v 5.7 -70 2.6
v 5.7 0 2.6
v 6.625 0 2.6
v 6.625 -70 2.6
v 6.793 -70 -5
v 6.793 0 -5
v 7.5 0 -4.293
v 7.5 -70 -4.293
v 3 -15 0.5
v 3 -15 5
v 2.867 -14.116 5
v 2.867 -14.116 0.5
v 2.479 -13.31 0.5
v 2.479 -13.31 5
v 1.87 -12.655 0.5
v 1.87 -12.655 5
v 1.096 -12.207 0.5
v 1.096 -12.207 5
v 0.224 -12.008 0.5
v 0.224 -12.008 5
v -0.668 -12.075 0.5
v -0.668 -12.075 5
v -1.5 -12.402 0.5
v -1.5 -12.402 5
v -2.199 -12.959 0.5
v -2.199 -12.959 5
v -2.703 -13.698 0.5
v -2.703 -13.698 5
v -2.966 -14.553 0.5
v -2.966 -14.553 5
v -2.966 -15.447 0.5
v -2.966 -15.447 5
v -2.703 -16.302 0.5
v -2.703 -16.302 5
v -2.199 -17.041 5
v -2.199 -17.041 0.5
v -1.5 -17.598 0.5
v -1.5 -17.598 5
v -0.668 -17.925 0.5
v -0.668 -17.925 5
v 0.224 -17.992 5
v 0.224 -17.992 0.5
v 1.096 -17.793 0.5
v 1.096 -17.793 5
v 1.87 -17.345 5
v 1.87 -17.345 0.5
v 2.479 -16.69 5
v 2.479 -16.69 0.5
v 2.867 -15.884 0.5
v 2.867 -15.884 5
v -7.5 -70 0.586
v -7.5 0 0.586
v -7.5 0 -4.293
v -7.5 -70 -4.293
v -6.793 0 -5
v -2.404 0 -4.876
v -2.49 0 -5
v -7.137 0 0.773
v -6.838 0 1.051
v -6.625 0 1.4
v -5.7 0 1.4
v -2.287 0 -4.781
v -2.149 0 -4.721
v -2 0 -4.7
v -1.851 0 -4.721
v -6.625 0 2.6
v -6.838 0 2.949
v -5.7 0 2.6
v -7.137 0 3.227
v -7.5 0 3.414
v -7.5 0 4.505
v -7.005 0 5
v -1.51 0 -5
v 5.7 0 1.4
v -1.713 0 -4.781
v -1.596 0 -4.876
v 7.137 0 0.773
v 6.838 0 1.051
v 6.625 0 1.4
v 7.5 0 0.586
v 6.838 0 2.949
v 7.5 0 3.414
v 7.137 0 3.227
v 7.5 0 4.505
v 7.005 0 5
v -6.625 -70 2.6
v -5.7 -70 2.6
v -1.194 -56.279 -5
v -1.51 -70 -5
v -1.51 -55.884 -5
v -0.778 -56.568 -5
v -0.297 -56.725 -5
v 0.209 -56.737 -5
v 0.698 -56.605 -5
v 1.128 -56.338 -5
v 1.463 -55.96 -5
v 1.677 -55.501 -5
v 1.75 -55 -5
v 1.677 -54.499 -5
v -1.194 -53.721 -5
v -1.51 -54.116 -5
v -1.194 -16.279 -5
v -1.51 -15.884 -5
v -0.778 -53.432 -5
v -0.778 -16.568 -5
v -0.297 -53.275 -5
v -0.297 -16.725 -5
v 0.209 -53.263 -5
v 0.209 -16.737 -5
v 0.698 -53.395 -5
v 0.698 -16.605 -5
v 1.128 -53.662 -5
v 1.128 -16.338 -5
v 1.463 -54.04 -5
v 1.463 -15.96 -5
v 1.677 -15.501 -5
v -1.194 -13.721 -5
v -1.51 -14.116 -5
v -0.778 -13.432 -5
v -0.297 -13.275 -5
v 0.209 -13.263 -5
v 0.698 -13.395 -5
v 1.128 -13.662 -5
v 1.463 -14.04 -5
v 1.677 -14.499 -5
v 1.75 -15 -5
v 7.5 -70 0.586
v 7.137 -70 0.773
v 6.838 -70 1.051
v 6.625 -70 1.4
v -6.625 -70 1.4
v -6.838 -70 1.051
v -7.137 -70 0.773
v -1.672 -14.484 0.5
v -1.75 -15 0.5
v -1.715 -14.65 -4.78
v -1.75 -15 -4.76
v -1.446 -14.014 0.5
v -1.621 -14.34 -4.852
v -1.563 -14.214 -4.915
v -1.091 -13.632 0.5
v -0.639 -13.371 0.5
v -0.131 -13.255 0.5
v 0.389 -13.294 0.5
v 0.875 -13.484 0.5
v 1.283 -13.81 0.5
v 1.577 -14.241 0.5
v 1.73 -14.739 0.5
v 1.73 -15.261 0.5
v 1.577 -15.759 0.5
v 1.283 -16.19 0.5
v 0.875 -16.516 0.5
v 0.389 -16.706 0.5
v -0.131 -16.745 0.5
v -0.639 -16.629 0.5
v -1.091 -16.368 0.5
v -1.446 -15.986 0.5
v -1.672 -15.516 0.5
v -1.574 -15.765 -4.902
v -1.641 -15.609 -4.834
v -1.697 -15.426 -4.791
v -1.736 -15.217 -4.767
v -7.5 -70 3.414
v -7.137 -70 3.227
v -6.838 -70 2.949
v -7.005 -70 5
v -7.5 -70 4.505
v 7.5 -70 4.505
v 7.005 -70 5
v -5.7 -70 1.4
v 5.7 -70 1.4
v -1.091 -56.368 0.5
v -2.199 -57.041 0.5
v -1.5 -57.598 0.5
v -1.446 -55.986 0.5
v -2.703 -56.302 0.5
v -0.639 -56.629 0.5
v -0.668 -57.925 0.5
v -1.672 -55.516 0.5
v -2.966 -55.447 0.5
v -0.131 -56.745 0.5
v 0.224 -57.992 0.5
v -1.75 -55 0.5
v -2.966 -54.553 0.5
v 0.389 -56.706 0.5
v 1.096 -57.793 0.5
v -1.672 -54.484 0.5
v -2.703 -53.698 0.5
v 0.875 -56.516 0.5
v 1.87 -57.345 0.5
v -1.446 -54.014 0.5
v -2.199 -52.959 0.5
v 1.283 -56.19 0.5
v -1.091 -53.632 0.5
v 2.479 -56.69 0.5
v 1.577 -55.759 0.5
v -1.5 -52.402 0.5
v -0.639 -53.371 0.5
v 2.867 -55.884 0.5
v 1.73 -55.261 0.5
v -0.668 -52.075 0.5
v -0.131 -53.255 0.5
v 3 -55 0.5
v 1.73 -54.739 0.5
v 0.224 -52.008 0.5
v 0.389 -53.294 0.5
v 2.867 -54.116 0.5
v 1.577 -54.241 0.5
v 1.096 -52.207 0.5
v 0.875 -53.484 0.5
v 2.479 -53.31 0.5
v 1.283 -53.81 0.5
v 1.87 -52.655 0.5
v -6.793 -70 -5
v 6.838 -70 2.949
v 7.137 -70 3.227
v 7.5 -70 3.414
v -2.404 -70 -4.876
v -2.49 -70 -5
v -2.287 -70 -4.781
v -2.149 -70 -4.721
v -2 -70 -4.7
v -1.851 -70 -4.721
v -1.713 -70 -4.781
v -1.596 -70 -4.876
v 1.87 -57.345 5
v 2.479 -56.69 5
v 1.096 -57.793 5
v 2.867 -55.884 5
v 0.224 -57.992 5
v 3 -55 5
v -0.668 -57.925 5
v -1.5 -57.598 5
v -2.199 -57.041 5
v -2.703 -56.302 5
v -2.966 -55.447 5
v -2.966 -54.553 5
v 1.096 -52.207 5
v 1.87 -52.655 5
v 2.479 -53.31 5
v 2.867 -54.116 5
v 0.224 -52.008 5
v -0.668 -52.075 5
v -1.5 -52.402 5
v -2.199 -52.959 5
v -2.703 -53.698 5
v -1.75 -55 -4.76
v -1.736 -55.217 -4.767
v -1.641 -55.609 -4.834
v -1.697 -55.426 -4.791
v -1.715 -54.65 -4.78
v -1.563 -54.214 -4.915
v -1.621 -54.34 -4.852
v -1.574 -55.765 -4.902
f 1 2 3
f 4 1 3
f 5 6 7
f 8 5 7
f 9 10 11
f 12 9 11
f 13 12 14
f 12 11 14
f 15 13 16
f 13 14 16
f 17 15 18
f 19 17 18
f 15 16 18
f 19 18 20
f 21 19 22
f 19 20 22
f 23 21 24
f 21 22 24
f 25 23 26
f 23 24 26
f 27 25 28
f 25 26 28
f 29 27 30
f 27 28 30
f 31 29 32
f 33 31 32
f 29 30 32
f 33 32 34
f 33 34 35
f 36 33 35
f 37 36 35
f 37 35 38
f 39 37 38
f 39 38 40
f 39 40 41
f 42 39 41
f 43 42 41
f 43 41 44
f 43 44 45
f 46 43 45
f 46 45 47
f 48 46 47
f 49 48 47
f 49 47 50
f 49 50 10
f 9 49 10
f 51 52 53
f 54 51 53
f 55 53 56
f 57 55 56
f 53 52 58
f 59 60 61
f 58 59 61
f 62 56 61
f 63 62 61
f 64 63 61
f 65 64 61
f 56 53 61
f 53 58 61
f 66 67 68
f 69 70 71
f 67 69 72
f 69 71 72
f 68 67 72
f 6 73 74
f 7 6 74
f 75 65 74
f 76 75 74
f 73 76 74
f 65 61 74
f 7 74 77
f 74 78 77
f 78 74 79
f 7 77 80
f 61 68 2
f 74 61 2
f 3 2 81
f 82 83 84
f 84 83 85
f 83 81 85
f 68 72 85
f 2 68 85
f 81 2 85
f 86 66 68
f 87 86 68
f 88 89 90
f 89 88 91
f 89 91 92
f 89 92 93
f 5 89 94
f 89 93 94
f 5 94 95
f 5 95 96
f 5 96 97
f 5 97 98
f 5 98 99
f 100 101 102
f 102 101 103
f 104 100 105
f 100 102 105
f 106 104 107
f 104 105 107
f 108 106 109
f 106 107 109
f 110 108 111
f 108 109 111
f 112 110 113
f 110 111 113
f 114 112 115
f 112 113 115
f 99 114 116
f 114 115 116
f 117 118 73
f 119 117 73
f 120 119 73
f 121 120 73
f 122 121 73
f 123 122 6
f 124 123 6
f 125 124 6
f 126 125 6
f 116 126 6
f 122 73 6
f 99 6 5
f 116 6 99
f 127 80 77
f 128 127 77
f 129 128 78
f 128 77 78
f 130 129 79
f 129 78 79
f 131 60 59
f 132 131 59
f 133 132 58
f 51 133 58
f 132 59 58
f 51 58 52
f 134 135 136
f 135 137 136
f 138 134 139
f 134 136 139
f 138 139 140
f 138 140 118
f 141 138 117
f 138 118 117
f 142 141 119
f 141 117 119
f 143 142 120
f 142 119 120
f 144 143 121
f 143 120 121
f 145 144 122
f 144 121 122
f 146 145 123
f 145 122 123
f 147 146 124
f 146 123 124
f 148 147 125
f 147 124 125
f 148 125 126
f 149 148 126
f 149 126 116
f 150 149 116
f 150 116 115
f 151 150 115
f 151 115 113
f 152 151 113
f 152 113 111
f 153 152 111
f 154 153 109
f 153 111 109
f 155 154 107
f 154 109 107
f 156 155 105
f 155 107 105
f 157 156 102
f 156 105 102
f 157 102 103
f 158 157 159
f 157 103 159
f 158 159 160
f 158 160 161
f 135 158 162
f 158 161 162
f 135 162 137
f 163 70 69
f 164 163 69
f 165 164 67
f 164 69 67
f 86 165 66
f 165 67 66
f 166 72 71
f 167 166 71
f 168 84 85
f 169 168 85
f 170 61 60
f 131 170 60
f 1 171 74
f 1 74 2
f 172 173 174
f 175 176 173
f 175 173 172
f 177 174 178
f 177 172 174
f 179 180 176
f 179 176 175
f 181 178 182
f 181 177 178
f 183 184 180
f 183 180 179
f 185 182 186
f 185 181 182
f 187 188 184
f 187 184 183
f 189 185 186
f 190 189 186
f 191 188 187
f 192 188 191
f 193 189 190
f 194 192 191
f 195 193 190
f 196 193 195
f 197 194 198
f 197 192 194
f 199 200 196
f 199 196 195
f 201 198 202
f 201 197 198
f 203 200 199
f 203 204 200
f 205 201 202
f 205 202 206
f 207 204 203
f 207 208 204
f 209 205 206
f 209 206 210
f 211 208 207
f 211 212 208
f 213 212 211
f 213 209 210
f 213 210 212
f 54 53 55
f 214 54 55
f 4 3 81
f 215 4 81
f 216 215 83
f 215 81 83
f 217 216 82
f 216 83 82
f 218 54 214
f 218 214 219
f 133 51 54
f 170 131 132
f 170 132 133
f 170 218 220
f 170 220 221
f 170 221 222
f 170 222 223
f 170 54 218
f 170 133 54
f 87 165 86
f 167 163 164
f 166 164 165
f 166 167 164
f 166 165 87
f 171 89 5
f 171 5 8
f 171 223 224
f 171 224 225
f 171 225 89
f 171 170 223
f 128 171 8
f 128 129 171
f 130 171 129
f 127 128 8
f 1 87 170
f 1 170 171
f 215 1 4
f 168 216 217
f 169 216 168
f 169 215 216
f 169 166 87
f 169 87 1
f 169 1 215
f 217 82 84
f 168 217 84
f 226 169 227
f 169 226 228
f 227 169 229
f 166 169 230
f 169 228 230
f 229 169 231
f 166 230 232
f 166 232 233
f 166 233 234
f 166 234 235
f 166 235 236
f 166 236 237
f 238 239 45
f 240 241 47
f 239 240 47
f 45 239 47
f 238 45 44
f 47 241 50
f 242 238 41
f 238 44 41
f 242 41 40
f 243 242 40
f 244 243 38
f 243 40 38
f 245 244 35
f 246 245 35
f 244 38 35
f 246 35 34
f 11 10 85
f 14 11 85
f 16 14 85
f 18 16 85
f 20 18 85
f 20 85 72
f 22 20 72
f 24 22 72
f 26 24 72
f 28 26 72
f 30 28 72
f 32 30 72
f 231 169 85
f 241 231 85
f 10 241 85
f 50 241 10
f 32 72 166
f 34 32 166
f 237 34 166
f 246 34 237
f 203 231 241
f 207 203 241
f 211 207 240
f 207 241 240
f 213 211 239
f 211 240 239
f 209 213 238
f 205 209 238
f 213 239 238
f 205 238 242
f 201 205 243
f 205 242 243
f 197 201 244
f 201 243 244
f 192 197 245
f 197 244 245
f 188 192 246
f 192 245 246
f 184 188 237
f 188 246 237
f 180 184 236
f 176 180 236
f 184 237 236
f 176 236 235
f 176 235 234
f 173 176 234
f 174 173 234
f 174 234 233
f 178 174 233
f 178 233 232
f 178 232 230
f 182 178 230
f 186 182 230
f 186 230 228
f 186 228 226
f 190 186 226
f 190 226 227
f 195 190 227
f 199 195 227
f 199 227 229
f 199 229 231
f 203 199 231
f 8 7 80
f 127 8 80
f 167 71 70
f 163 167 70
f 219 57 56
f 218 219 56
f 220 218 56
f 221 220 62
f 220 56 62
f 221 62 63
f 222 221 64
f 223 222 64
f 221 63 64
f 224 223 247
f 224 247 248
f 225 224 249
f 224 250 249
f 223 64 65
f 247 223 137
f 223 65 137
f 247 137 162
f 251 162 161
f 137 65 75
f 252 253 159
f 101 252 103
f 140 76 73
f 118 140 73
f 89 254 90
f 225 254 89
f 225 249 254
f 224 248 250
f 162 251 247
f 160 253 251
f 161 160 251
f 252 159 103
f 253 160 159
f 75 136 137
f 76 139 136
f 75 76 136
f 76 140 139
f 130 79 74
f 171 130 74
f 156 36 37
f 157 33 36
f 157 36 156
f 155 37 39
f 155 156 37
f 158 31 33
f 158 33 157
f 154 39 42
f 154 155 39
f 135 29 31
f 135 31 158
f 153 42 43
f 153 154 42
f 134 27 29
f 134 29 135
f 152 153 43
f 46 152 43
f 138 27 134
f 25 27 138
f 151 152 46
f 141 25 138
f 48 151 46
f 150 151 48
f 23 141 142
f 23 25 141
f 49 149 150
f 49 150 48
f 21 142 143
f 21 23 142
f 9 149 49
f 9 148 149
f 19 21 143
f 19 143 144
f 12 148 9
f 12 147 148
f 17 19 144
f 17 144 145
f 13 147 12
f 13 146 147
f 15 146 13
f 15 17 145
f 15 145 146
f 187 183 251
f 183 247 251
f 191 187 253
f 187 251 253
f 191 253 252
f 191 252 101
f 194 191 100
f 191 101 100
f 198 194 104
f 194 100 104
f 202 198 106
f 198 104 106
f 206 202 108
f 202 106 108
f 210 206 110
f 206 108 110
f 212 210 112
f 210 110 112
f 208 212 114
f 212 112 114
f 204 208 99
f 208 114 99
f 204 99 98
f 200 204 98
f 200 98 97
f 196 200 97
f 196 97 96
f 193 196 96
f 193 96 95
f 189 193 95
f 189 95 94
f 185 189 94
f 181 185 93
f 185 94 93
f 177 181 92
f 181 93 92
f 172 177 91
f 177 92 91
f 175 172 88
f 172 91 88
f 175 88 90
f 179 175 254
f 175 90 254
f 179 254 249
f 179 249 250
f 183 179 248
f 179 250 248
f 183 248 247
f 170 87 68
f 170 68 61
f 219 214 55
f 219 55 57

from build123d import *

# Parameters (mm, degrees)
F1_DEPTH       = 70
F3_D           = 3.5
F3_CBORE_D     = 6
F3_CBORE_DEPTH = 4.5


with BuildPart() as f1:
    # F0 (on Front) → F1 (new body)
    with BuildSketch(Plane.XZ):
        with BuildLine():
            Line((-1.510102, -5), (6.792893, -5))
            Line((6.792893, -5), (7.5, -4.292893))
            Line((7.5, -4.292893), (7.5, 0.585786))
            ThreePointArc((7.5, 0.585786), (6.978027, 0.902015), (6.625227, 1.4))
            Line((6.625227, 1.4), (5.7, 1.4))
            Line((5.7, 1.4), (5.7, 2.6))
            Line((5.7, 2.6), (6.625227, 2.6))
            ThreePointArc((6.625227, 2.6), (6.978027, 3.097985), (7.5, 3.414214))
            Line((7.5, 3.414214), (7.5, 4.505025))
            Line((7.5, 4.505025), (7.005025, 5))
            Line((7.005025, 5), (-7.005025, 5))
            Line((-7.005025, 5), (-7.5, 4.505025))
            Line((-7.5, 4.505025), (-7.5, 3.414214))
            ThreePointArc((-7.5, 3.414214), (-6.978027, 3.097985), (-6.625227, 2.6))
            Line((-6.625227, 2.6), (-5.7, 2.6))
            Line((-5.7, 2.6), (-5.7, 1.4))
            Line((-5.7, 1.4), (-6.625227, 1.4))
            ThreePointArc((-6.625227, 1.4), (-6.978027, 0.902015), (-7.5, 0.585786))
            Line((-7.5, 0.585786), (-7.5, -4.292893))
            Line((-7.5, -4.292893), (-6.792893, -5))
            Line((-6.792893, -5), (-2.489898, -5))
            ThreePointArc((-2.489898, -5), (-2, -4.7), (-1.510102, -5))
        make_face()
    extrude(amount=F1_DEPTH)

    # F3 (through all)
    with Locations(Plane.XY.offset(5)):
        with Locations((0, -95), (0, -215), (0, -295), (0, -55), (0, -335), (0, -15), (0, -175), (0, -255), (0, -135), (0, -855), (0, -455), (0, -895), (0, -815), (0, -655), (0, -775), (0, -935), (0, -615), (0, -735), (0, -535), (0, -695), (0, -375), (0, -575), (0, -495), (0, -415), (0, -1175), (0, -1375), (0, -1215), (0, -1615), (0, -1095), (0, -1135), (0, -1655), (0, -1255), (0, -1055), (0, -1295), (0, -975), (0, -1535), (0, -1415), (0, -1695), (0, -1335), (0, -1575), (0, -1495), (0, -1015), (0, -1455), (0, -1895), (0, -1775), (0, -1735), (0, -1975), (0, -1935), (0, -1815), (0, -1855)):
            CounterBoreHole(F3_D / 2, F3_CBORE_D / 2, F3_CBORE_DEPTH)


solid = f1.part
